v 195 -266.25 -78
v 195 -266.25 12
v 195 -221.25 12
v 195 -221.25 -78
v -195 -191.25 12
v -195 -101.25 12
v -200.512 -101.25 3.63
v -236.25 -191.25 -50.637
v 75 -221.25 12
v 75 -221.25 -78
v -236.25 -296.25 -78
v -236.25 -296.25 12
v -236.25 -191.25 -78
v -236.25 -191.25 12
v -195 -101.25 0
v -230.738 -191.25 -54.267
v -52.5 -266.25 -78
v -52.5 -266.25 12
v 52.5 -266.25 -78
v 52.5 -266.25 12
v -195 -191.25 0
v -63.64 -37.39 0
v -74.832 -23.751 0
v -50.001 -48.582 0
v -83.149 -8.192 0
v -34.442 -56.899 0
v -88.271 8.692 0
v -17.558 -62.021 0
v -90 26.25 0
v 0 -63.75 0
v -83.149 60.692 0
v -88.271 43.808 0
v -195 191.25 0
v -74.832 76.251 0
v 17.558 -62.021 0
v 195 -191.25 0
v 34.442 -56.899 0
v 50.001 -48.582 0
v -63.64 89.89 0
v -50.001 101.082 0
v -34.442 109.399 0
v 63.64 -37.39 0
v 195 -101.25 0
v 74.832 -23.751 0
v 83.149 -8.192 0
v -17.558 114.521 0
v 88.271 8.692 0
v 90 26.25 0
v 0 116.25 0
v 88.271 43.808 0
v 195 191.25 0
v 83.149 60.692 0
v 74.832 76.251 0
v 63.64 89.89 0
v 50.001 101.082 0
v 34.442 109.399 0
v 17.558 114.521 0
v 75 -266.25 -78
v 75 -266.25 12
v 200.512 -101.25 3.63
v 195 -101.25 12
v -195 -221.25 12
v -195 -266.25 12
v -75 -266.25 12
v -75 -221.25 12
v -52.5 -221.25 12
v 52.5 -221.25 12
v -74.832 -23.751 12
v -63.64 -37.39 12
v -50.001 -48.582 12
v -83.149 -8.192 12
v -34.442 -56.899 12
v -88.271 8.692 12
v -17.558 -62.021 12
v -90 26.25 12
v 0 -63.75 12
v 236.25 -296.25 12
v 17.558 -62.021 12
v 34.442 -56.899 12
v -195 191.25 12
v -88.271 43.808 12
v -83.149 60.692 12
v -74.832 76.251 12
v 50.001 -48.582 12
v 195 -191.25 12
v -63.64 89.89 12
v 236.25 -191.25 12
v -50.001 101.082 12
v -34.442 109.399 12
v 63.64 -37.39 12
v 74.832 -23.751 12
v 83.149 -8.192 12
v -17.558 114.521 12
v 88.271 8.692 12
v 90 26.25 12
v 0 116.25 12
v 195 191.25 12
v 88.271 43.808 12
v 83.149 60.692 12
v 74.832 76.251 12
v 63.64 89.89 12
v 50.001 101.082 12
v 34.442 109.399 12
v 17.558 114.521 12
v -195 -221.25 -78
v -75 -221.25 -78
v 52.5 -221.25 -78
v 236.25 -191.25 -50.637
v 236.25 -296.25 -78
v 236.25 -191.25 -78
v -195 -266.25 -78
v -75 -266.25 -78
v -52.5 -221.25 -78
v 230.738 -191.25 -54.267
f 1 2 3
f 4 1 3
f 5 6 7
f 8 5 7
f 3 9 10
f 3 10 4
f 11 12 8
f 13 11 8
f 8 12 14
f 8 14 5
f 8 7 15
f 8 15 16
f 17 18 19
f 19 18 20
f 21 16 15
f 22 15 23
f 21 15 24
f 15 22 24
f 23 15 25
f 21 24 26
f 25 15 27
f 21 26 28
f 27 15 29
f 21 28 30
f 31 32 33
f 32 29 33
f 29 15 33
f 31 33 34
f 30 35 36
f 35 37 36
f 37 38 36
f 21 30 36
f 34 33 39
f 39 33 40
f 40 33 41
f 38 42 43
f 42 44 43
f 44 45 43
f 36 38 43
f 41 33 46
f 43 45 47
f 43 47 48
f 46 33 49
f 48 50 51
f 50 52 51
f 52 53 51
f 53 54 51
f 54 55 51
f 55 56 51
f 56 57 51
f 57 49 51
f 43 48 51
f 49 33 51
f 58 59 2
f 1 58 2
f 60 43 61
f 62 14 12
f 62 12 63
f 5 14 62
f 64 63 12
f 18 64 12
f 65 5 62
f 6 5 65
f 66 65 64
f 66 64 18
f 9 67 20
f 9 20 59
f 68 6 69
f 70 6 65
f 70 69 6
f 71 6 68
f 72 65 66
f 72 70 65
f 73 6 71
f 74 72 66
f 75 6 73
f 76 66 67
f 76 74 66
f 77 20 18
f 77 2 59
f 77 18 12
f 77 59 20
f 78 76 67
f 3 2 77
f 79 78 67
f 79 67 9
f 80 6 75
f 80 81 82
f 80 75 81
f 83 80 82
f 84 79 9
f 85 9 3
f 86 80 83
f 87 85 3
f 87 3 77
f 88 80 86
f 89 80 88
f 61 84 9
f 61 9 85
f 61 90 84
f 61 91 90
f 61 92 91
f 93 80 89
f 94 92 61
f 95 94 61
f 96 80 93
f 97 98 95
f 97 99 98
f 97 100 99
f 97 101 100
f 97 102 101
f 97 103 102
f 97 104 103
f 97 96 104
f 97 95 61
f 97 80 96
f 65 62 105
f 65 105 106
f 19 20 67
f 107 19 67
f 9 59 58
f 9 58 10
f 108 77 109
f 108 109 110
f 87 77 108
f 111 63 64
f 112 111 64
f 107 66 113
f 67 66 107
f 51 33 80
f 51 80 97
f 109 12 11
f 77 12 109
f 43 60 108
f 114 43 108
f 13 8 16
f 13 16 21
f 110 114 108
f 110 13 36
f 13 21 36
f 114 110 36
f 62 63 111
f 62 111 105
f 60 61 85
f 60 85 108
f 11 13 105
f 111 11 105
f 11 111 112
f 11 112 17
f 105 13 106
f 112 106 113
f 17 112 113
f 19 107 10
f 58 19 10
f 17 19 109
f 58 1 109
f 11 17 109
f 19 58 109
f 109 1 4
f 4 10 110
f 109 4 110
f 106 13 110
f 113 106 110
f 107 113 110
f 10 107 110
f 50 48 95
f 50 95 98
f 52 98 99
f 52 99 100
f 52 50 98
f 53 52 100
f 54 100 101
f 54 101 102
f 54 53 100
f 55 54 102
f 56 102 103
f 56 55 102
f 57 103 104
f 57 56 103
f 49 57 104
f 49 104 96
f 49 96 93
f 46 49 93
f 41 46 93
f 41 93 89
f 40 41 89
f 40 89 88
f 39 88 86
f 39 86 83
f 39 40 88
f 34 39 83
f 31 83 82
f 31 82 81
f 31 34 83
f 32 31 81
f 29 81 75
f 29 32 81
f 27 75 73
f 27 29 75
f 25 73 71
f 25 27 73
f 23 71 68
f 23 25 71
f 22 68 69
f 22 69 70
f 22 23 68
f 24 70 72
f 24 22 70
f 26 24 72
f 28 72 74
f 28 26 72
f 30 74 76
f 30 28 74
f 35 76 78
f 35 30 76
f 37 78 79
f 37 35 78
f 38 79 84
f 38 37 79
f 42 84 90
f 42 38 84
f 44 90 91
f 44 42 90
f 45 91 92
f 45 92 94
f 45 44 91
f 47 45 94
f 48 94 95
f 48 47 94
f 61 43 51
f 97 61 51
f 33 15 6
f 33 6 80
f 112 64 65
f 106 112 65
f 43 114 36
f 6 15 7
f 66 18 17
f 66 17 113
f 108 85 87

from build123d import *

# Parameters (mm, degrees)
SKETCH1_W           = 390
SKETCH1_H           = 382.5
SKETCH1_R           = 90
BOSS_EXTRUDE1_DEPTH = 12
SKETCH2_W           = 472.5
SKETCH2_H           = 105
SKETCH2_W_2         = 120
SKETCH2_H_2         = 45
SKETCH2_W_3         = 105
BOSS_EXTRUDE2_DEPTH = 90
BOSS_EXTRUDE3_DEPTH = 90
CUT_EXTRUDE1_DEPTH  = 90


with BuildPart() as part:
    # Sketch1 → Boss-Extrude1 (new body)
    with BuildSketch(Plane.XY):
        Rectangle(SKETCH1_W, SKETCH1_H)
        with Locations((0, 26.25)):
            Circle(SKETCH1_R, mode=Mode.SUBTRACT)
    extrude(amount=BOSS_EXTRUDE1_DEPTH)

    # Sketch2 → Boss-Extrude2 (add)
    with BuildSketch(Plane.XY.offset(12)):
        with Locations((0, -243.75)):
            Rectangle(SKETCH2_W, SKETCH2_H)
        with Locations((135, -243.75)):
            Rectangle(SKETCH2_W_2, SKETCH2_H_2, mode=Mode.SUBTRACT)
        with Locations((0, -243.75)):
            Rectangle(SKETCH2_W_3, SKETCH2_H_2, mode=Mode.SUBTRACT)
        with Locations((-135, -243.75)):
            Rectangle(SKETCH2_W_2, SKETCH2_H_2, mode=Mode.SUBTRACT)
    extrude(amount=-BOSS_EXTRUDE2_DEPTH)

    # Sketch3 → Boss-Extrude3 (add)
    with BuildSketch(Plane(origin=(0, -191.25, 0), x_dir=(1, 0, 0), z_dir=(0, 1, 0))):
        Polygon((195, -12), (236.25, 50.637349082), (230.737913281, 54.267349082), (195, 0), align=None)
    boss_extrude3 = extrude(amount=BOSS_EXTRUDE3_DEPTH)

    # Sketch4 → Cut-Extrude1 (cut)
    with BuildSketch(Plane(origin=(141.524586719, 0, 93.201409187), x_dir=(0.5500000000000003, 0, -0.8351646544245032), z_dir=(0.8351646544245033, 0, 0.5500000000000003))):
        Polygon((172.228024147, -101.25), (107.25, -101.25), (172.228024147, -191.25), align=None)
    cut_extrude1 = extrude(amount=-CUT_EXTRUDE1_DEPTH, mode=Mode.SUBTRACT)

    # Mirror1: Boss-Extrude3, Cut-Extrude1 across plane
    add(boss_extrude3.mirror(Plane(origin=(0, 0, 0), x_dir=(0, 0, 1), z_dir=(1, 0, 0))))
    add(cut_extrude1.mirror(Plane(origin=(0, 0, 0), x_dir=(0, 0, 1), z_dir=(1, 0, 0))), mode=Mode.SUBTRACT)


solid = part.part
